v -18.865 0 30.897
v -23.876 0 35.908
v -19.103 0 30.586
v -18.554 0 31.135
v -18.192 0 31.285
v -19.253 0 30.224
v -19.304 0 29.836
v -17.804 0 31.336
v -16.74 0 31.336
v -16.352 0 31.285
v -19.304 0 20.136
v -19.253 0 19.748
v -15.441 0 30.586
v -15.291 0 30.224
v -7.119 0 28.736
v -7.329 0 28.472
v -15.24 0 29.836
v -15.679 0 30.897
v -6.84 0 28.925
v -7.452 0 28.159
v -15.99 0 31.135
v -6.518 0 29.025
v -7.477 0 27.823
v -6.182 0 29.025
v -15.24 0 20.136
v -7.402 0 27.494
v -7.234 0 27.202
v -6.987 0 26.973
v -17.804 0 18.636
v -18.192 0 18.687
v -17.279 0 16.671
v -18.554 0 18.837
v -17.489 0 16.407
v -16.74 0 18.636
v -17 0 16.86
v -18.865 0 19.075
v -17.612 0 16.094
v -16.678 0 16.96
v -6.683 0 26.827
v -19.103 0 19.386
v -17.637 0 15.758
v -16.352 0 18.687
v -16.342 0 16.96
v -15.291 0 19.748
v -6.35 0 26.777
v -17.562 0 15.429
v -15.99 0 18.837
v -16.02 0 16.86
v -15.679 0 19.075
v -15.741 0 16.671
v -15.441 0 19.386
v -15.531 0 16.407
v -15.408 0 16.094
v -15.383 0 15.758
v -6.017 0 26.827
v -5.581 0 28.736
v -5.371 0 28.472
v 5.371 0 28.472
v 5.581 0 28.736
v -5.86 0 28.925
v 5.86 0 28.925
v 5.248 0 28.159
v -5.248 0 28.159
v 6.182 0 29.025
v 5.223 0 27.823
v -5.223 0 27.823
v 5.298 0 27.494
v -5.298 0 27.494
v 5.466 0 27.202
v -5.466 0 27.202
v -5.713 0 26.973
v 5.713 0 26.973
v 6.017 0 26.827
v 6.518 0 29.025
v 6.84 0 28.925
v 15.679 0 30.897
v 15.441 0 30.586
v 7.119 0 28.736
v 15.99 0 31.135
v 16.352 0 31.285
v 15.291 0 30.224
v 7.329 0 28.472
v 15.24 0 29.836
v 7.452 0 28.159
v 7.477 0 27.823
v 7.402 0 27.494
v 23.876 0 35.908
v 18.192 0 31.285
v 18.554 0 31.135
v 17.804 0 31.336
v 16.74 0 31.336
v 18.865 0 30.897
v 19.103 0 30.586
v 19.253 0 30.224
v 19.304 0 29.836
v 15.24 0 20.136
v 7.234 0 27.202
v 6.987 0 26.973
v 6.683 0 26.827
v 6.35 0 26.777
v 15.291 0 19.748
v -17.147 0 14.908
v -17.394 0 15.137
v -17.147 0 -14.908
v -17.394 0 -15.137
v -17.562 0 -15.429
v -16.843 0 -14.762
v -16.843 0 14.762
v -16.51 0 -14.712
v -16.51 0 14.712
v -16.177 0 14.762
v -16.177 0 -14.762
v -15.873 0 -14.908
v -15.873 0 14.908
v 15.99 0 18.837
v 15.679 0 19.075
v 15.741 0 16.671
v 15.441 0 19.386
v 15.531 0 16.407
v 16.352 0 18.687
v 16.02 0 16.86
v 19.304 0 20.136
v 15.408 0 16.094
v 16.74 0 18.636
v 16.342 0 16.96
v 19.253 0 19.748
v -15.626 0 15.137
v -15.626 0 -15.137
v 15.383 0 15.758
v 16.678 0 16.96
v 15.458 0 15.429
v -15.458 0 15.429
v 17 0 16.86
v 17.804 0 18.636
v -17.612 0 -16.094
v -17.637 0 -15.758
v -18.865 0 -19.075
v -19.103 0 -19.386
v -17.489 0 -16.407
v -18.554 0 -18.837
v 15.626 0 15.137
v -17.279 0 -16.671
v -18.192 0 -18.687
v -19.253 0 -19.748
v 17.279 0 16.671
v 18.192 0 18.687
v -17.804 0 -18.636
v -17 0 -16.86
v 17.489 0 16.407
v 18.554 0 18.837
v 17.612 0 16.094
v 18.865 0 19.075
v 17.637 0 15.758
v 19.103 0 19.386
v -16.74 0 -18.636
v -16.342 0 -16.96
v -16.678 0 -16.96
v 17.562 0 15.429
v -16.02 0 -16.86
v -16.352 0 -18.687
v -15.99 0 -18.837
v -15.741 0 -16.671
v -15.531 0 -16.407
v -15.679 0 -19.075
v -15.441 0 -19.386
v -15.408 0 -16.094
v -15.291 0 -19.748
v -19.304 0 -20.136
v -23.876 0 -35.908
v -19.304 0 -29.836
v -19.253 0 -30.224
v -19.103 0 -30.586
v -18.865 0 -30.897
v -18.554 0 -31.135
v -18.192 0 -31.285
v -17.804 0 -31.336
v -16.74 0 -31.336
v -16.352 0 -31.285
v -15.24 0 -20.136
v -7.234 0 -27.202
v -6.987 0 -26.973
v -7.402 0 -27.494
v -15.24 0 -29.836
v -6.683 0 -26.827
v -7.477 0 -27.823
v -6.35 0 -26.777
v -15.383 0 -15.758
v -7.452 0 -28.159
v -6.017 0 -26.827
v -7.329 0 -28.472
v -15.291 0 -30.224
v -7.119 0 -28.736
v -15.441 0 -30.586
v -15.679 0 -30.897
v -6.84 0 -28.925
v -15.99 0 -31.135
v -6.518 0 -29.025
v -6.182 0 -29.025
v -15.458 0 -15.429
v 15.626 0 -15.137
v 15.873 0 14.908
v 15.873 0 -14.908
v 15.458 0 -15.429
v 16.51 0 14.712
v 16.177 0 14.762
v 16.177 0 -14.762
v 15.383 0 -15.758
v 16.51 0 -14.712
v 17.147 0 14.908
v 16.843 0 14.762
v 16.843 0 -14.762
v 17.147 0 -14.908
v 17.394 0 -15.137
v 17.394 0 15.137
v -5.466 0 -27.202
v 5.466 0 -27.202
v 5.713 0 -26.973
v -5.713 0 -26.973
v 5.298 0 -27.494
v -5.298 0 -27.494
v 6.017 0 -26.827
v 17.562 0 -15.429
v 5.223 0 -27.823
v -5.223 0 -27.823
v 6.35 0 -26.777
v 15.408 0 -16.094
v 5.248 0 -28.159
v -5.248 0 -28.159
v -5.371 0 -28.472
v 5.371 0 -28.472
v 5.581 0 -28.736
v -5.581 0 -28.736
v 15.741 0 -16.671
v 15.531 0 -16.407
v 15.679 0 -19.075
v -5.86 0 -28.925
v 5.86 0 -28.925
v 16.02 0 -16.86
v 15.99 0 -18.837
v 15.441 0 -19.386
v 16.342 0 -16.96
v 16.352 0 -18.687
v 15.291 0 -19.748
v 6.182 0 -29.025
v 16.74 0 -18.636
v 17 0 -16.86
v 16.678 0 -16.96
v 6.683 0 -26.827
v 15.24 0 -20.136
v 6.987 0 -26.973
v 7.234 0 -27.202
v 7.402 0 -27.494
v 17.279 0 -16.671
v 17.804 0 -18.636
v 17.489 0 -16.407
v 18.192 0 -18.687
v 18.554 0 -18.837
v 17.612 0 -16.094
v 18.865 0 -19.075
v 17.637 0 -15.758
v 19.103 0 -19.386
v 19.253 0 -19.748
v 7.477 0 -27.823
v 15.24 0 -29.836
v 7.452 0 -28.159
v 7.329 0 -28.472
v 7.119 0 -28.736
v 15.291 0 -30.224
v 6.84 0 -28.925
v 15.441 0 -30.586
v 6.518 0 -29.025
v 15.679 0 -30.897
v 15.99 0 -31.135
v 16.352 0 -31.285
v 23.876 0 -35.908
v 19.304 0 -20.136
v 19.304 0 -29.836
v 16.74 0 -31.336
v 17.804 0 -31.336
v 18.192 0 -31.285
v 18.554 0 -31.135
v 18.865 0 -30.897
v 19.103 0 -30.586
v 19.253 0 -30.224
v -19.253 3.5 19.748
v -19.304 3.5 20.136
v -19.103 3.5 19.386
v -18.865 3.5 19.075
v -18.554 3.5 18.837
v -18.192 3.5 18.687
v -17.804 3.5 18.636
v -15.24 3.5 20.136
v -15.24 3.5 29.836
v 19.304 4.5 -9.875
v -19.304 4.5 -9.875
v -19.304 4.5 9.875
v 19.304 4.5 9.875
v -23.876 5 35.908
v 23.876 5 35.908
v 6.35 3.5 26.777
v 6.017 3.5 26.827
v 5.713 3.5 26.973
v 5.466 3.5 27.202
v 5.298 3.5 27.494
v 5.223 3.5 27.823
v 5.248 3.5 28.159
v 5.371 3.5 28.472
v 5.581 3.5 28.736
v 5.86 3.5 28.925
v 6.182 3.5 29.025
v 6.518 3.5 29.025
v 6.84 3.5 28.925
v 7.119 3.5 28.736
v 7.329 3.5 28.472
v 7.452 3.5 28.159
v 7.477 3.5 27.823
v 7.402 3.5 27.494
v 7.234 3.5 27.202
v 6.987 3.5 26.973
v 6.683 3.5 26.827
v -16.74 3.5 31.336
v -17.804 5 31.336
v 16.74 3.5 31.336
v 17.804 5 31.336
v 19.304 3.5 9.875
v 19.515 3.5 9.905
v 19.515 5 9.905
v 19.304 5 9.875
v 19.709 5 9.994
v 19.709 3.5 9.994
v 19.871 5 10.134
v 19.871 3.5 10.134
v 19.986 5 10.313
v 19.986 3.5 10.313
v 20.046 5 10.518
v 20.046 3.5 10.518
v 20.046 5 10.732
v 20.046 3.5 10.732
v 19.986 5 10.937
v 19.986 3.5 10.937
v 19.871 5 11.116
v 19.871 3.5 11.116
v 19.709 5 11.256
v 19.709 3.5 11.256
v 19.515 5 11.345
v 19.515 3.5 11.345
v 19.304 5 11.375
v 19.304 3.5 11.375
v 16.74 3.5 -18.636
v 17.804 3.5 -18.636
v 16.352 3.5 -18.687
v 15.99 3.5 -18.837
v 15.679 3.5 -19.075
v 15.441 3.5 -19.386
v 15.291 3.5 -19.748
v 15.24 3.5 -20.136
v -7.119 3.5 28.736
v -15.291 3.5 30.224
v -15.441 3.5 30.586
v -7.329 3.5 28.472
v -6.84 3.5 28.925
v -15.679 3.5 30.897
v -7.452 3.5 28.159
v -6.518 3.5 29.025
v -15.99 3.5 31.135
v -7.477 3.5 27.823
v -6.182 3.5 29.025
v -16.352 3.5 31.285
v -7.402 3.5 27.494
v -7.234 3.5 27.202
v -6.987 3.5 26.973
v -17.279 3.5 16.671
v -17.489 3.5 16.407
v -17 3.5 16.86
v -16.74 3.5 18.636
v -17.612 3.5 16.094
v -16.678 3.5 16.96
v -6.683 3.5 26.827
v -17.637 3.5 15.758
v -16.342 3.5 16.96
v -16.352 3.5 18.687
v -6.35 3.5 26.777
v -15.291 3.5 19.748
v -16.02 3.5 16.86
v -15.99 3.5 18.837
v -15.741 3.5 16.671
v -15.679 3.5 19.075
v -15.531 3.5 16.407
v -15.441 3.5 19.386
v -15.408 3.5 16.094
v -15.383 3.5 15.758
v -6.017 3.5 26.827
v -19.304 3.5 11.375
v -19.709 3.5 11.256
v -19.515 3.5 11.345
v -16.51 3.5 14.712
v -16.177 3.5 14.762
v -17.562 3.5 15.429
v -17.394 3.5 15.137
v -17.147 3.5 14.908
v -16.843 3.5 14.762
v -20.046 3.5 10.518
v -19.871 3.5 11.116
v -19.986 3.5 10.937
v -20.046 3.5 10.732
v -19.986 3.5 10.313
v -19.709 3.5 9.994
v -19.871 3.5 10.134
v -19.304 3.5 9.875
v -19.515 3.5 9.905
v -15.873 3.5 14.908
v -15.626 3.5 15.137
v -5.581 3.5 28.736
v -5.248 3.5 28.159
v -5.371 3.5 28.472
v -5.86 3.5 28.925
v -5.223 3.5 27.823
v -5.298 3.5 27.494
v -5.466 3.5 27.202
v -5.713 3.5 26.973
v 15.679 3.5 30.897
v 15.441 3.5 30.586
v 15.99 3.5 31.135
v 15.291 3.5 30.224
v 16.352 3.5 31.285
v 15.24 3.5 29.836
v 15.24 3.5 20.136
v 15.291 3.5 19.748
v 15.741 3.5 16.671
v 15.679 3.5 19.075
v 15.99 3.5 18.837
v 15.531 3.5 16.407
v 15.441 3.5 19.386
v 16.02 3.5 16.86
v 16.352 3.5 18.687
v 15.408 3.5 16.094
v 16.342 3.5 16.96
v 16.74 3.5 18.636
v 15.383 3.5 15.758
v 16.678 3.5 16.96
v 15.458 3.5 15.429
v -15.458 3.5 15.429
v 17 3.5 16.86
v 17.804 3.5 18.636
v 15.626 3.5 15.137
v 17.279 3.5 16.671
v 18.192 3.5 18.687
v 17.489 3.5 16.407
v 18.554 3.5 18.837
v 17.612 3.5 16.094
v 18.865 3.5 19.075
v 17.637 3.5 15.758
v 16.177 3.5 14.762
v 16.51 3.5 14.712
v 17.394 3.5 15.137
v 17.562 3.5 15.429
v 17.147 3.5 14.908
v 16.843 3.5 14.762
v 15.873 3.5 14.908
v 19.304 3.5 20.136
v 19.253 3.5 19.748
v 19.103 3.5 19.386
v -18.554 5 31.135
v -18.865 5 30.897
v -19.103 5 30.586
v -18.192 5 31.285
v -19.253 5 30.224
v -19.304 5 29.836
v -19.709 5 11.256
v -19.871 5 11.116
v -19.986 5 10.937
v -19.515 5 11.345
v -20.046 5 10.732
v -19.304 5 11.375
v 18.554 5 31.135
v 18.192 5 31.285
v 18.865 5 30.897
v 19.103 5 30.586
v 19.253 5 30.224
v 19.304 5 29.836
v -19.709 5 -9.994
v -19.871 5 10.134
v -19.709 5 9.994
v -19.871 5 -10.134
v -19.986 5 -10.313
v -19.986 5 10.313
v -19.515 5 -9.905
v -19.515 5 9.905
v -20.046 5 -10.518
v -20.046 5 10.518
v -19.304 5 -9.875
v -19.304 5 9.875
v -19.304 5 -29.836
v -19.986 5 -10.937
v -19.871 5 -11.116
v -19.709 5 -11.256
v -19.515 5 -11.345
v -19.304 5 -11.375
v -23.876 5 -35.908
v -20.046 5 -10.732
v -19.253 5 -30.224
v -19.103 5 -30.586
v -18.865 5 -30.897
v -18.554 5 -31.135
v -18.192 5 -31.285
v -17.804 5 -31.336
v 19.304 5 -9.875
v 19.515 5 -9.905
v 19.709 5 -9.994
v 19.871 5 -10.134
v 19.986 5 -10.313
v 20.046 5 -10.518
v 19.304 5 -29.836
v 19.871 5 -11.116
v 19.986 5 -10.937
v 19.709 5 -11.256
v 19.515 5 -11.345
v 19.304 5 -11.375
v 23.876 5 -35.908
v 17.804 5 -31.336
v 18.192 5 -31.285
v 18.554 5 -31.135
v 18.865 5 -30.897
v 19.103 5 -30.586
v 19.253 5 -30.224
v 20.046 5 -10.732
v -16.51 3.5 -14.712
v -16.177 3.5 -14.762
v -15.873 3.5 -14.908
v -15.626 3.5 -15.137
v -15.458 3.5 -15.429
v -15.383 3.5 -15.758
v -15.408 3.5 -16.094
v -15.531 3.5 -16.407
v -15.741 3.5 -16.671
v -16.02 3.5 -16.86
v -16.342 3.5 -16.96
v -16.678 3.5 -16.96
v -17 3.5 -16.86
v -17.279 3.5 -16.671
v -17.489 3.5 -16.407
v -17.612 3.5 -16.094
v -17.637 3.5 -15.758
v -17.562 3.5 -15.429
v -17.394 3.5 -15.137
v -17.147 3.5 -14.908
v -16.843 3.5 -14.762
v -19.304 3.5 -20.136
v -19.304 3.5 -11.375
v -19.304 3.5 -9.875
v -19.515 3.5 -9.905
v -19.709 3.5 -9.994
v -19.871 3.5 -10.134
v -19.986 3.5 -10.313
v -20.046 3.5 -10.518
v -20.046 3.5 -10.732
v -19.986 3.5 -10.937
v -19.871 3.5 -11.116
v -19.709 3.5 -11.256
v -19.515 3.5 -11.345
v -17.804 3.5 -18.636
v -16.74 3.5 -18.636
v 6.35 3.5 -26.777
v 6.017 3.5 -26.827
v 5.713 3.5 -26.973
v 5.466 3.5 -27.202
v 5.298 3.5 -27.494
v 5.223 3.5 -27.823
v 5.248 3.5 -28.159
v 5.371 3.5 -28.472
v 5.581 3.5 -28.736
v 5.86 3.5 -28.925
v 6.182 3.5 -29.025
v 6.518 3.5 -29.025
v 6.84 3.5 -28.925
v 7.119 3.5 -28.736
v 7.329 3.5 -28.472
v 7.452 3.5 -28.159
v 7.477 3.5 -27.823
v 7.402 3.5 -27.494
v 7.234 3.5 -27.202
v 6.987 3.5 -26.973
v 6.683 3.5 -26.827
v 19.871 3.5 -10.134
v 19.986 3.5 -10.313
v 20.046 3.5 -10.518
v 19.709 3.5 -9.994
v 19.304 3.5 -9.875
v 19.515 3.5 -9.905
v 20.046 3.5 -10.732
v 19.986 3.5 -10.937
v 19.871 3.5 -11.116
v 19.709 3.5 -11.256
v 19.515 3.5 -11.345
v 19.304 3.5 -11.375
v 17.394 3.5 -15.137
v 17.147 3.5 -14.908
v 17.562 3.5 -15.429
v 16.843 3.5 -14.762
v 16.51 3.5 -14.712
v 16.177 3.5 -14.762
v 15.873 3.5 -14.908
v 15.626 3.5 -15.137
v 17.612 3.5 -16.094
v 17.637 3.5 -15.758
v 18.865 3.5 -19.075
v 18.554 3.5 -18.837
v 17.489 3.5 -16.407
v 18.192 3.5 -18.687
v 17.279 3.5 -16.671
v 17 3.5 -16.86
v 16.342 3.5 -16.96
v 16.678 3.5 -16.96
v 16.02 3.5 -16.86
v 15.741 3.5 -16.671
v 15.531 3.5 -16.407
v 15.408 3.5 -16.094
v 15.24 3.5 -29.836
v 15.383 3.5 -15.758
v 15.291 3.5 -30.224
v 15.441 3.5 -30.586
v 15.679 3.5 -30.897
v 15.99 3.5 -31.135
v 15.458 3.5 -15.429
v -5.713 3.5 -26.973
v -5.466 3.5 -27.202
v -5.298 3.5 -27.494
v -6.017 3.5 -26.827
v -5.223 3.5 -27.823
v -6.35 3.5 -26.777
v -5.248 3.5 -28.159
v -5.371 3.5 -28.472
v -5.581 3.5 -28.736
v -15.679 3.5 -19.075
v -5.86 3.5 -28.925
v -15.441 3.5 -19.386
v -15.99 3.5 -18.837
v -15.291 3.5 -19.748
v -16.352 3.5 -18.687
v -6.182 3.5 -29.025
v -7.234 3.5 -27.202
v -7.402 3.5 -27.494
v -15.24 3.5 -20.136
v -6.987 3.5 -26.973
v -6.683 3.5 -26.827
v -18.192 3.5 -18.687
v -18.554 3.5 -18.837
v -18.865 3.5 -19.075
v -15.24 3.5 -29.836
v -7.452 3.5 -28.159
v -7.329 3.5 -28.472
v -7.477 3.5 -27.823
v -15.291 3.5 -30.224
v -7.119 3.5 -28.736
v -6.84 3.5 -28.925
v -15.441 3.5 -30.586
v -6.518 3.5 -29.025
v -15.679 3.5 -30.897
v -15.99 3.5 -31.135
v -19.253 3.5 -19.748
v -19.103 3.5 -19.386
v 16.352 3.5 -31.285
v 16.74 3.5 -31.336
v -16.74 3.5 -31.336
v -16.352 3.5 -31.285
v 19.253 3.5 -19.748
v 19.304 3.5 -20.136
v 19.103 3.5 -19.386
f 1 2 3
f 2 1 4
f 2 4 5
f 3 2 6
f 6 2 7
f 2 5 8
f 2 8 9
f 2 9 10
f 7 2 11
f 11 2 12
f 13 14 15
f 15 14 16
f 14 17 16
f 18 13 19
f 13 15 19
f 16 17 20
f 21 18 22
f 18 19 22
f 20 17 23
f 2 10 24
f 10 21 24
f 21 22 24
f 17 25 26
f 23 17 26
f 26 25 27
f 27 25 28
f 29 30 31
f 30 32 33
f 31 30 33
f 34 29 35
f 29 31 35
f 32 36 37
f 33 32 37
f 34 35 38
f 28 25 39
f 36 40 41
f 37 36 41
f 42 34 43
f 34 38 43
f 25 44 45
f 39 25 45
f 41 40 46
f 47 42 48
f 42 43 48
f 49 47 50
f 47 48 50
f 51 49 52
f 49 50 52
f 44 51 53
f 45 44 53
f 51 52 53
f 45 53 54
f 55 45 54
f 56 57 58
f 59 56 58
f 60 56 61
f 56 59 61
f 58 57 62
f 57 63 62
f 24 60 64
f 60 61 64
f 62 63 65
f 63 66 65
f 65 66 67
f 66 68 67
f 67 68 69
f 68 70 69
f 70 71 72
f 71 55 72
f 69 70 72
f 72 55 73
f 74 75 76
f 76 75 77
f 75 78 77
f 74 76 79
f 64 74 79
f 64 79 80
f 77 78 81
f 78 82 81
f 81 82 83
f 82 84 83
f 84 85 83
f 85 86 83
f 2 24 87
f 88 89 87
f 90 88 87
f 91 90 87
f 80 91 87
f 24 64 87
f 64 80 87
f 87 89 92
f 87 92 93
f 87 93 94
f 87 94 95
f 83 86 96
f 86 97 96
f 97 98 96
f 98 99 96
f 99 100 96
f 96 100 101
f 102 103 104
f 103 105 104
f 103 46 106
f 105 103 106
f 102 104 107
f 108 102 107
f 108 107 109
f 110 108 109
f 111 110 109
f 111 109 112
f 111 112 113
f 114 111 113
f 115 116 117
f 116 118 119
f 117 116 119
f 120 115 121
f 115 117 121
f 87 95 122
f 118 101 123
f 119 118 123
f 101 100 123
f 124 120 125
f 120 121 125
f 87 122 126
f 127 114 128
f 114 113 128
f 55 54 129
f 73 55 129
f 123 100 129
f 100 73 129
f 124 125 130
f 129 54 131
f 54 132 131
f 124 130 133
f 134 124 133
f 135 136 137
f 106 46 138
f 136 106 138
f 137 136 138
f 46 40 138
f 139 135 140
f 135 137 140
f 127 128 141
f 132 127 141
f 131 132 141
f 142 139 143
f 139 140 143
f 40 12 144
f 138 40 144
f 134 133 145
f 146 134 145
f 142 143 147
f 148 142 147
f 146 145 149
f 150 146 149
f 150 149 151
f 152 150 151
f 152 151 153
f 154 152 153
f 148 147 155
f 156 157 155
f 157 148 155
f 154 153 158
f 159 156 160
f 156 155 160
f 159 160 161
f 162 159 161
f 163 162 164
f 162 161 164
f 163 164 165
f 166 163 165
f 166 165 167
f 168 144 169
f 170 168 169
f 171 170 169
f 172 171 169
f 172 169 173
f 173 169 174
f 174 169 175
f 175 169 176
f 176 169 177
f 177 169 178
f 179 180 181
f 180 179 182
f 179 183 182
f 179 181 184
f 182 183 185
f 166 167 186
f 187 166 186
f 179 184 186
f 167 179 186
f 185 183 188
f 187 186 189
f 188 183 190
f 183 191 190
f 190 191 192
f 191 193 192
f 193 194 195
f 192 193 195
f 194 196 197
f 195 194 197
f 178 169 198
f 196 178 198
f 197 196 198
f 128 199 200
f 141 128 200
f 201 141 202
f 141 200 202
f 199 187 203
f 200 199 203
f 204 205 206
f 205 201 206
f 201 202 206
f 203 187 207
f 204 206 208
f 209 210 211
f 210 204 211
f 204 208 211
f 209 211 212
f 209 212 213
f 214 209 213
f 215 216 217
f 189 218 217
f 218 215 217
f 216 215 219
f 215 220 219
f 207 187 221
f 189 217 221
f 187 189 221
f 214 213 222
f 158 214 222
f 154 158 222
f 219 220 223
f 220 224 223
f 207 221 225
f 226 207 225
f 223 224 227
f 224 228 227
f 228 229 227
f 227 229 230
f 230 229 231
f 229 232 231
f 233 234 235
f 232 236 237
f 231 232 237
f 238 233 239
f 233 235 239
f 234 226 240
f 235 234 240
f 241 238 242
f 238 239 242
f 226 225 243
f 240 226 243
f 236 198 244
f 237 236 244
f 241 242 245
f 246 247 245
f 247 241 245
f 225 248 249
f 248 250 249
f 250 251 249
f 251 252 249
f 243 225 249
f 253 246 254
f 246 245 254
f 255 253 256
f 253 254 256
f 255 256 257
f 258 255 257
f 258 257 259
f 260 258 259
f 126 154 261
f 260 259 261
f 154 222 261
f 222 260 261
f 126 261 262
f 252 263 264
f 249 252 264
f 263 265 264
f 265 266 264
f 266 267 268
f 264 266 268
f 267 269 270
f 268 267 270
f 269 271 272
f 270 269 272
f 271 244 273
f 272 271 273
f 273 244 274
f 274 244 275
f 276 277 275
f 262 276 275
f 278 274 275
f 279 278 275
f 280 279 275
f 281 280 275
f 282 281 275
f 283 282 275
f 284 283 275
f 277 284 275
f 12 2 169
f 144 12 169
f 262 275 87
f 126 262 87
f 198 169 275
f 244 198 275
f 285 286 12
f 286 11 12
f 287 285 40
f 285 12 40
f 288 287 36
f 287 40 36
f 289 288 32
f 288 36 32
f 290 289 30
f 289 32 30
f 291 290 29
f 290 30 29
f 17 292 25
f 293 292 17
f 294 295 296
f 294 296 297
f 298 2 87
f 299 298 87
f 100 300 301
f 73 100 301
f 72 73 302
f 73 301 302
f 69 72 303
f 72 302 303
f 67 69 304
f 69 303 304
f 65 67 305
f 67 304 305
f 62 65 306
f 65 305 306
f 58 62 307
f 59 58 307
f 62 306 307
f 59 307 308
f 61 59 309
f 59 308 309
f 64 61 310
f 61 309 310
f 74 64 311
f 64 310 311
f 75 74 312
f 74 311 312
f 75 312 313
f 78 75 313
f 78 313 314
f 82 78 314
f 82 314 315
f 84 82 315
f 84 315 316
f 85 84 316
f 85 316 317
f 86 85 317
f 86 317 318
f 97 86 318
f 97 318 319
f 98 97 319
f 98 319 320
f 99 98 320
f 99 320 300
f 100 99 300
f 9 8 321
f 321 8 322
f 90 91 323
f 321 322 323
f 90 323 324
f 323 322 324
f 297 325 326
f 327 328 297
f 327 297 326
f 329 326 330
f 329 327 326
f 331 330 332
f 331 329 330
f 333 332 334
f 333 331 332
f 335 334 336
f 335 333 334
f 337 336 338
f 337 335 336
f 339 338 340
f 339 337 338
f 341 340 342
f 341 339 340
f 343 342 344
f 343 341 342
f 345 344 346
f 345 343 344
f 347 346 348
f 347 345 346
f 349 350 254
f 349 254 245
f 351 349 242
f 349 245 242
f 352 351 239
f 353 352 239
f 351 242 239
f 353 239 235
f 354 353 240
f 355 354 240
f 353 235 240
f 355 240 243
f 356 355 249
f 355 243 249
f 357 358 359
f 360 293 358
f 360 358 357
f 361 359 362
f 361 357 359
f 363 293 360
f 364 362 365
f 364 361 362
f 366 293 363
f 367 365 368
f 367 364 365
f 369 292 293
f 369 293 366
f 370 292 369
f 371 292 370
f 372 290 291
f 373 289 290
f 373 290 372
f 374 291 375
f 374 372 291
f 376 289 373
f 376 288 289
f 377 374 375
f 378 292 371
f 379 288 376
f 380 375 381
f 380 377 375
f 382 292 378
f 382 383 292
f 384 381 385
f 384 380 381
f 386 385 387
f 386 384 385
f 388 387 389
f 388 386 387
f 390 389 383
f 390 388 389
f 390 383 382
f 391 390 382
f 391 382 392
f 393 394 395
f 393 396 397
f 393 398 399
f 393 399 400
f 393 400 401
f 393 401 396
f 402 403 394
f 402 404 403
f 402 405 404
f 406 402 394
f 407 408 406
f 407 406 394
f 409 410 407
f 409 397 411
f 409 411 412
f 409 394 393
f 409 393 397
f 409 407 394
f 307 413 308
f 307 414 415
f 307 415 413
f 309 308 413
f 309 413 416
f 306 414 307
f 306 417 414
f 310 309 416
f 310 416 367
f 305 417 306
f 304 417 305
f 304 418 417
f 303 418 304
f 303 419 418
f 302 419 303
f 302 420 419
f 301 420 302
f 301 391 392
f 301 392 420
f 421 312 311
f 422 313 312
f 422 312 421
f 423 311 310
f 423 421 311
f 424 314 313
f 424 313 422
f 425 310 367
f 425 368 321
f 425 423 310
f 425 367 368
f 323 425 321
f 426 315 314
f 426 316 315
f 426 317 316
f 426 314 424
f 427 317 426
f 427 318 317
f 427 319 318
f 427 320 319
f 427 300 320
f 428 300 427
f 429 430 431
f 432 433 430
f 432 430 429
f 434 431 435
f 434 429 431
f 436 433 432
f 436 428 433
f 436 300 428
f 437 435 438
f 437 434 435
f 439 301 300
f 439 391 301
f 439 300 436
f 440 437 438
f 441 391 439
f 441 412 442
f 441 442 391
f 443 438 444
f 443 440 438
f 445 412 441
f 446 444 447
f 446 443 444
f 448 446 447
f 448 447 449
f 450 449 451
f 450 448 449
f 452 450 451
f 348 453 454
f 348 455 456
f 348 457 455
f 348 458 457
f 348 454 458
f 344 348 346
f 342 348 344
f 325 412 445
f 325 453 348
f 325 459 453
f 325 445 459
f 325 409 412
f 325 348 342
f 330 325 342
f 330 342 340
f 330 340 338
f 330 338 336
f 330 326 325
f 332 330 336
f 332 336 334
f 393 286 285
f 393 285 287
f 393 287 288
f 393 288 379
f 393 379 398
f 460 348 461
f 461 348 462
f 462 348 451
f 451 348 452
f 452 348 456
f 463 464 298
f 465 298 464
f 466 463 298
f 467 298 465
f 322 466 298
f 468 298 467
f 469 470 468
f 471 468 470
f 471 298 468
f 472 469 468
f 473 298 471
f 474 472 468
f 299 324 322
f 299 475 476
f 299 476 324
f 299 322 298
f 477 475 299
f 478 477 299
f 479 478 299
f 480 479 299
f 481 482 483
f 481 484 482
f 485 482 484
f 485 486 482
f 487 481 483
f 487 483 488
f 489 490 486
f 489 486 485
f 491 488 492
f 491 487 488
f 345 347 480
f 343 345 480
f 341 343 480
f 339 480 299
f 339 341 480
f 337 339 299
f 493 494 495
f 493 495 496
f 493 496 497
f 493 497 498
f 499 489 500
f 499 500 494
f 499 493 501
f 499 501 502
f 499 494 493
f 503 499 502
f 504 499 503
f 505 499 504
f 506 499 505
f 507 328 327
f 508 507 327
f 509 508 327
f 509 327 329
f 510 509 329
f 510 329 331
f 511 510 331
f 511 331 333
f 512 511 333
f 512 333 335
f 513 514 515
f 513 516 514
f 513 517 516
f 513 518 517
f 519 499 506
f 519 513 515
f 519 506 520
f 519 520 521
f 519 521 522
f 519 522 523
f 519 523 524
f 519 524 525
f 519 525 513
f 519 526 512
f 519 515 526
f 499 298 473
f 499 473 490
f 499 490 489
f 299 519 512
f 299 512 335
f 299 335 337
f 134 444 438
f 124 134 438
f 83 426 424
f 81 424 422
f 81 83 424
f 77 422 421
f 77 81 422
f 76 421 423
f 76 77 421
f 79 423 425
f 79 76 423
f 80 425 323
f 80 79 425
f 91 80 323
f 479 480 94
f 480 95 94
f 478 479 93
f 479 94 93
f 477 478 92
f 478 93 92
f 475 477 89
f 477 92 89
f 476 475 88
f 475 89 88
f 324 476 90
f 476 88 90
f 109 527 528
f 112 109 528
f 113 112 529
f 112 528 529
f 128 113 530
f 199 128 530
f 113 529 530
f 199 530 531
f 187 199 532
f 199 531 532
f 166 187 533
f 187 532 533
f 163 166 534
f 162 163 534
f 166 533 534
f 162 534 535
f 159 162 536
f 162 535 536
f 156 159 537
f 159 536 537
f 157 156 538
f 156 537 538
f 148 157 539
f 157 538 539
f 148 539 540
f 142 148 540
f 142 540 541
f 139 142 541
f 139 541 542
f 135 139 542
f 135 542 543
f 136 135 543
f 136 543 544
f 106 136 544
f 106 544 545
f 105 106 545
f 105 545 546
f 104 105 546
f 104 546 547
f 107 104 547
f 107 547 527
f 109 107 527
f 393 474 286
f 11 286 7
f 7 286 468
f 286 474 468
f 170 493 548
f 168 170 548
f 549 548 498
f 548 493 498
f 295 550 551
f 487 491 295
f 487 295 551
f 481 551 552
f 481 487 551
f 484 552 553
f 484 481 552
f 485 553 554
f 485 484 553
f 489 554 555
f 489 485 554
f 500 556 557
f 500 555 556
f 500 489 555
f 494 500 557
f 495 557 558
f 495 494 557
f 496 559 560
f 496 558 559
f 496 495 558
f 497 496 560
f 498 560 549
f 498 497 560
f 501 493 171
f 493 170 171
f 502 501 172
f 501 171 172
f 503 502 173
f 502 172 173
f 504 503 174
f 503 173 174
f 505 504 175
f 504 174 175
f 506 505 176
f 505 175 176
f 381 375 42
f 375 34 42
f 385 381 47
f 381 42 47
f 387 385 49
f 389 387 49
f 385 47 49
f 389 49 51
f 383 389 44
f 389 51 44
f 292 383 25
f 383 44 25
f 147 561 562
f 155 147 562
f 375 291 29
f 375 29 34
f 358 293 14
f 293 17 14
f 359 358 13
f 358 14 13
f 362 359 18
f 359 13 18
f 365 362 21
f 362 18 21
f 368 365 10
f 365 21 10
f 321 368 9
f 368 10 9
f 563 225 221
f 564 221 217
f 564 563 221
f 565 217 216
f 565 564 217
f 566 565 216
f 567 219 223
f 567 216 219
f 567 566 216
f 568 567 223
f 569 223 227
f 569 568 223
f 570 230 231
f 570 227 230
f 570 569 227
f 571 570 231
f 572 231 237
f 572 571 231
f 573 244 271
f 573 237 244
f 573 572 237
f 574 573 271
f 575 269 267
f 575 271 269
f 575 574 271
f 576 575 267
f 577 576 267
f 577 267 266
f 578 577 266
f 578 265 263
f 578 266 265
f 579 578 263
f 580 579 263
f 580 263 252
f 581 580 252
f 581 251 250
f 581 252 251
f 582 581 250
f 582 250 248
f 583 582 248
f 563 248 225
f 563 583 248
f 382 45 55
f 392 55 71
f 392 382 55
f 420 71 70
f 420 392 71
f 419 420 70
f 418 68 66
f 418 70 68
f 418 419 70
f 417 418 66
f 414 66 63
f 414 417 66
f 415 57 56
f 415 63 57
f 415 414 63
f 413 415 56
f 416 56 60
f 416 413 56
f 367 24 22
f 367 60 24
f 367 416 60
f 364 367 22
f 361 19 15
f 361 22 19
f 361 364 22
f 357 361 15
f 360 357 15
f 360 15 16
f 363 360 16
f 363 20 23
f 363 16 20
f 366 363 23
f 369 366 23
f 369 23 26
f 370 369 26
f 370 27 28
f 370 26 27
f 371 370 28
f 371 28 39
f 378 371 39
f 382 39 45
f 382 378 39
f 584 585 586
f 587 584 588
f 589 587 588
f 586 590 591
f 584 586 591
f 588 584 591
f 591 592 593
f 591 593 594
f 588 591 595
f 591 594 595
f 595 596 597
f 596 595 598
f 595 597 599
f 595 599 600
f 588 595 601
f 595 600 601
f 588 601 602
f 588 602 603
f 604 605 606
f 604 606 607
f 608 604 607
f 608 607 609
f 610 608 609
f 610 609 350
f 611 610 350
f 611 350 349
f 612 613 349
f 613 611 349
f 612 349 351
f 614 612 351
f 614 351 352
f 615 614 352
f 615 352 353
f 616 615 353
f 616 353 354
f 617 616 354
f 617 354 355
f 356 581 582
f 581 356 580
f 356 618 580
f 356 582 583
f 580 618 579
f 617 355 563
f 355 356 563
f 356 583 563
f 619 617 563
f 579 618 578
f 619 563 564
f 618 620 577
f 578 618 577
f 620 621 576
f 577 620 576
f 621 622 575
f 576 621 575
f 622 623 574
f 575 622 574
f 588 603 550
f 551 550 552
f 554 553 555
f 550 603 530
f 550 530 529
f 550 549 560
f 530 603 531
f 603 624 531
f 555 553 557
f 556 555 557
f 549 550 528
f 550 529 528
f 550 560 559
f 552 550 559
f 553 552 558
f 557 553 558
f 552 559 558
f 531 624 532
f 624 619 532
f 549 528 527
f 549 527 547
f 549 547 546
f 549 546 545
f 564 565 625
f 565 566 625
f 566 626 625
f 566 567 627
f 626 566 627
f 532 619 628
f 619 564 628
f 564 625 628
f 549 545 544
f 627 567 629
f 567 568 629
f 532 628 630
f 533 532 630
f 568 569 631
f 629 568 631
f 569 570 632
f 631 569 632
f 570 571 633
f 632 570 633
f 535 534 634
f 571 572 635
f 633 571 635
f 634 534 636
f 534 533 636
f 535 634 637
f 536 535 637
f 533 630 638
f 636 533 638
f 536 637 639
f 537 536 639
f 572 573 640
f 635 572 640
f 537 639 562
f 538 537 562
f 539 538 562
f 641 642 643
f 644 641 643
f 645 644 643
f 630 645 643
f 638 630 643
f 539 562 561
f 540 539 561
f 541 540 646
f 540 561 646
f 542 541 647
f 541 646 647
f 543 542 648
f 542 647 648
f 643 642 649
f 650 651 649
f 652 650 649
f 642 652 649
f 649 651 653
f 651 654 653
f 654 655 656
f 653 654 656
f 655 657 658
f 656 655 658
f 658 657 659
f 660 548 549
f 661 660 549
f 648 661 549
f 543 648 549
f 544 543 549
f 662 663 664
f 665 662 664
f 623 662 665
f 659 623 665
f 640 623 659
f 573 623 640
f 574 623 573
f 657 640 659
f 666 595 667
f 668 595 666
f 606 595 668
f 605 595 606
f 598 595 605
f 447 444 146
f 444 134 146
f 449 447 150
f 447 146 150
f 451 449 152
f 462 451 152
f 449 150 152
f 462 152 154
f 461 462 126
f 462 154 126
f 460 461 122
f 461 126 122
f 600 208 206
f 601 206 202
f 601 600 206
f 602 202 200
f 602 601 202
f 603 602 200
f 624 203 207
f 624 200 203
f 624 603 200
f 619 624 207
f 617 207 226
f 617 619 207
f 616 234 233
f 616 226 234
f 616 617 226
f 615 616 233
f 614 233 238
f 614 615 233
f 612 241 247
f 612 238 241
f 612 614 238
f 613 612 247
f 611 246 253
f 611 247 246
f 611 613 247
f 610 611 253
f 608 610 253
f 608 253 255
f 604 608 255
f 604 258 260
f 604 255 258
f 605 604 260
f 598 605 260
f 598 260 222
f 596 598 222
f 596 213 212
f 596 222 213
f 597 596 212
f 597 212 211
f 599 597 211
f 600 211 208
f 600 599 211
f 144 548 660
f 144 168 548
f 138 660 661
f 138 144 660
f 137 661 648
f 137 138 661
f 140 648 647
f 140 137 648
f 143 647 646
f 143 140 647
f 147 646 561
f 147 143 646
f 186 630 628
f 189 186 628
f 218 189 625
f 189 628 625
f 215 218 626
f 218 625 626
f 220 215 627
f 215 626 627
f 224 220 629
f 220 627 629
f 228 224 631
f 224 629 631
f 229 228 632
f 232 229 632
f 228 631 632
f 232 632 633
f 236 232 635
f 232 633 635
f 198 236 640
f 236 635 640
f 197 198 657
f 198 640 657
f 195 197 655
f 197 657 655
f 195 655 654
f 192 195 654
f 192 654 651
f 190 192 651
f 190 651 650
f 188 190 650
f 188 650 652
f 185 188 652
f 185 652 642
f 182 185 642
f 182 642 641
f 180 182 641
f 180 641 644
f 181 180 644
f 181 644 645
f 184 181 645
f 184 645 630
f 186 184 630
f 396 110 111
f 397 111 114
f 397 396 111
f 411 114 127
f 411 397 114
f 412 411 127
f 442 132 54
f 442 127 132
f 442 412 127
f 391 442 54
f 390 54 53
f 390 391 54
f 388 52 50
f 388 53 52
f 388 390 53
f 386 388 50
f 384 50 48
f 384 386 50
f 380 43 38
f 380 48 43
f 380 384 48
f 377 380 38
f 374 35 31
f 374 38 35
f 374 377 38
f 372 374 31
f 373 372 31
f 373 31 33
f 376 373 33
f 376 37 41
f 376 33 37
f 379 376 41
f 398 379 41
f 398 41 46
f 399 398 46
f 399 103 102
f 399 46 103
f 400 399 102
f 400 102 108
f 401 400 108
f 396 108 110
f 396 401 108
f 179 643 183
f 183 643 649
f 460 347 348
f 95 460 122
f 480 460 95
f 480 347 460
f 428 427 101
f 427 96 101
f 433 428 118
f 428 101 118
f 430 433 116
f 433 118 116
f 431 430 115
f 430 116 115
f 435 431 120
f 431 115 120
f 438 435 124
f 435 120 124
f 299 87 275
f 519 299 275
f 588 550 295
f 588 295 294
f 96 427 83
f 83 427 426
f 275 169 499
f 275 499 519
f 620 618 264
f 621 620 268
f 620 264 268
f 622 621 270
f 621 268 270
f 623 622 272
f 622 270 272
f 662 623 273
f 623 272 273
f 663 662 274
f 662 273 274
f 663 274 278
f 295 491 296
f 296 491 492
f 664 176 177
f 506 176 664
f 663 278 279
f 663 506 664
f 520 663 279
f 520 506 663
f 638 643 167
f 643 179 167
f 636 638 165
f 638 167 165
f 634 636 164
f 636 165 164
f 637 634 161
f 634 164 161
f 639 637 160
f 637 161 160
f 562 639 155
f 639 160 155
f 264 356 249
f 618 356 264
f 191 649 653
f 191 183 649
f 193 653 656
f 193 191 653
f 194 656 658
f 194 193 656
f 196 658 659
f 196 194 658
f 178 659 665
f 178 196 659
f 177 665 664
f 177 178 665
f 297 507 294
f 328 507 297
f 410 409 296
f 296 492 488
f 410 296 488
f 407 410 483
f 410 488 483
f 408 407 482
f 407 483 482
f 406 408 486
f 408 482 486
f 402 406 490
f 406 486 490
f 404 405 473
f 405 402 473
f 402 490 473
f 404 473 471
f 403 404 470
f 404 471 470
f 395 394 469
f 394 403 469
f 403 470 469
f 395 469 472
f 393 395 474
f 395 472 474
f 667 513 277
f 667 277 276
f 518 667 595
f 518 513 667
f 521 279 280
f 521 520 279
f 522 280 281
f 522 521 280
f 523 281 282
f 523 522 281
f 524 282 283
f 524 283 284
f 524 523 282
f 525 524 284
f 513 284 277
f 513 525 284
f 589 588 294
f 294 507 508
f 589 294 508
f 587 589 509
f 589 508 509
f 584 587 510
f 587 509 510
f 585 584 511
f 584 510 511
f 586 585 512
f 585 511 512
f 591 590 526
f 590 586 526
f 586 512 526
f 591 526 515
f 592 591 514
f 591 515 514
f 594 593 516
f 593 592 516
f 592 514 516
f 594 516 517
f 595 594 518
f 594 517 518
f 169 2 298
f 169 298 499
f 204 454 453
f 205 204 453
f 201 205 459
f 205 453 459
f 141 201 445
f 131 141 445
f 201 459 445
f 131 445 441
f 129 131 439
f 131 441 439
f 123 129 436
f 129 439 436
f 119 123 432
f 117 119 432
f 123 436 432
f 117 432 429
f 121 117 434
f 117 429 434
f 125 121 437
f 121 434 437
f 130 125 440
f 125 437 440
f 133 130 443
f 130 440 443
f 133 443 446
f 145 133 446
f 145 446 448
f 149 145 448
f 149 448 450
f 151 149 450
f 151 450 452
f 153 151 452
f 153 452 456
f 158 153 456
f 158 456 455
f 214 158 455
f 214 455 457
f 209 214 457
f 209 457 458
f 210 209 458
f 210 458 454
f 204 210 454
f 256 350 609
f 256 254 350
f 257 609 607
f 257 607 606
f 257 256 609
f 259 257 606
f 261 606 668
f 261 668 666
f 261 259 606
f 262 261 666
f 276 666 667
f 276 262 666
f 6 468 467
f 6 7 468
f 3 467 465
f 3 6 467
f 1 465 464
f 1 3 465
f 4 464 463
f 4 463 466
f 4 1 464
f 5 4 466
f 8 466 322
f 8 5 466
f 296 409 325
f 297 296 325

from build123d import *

# Parameters (mm, degrees)
SKETCH1_W                                  = 47.752
SKETCH1_H                                  = 71.816
BOSS_EXTRUDE1_DEPTH                        = 5
SKETCH2_W                                  = 38.608
SKETCH2_H                                  = 62.672
CUT_EXTRUDE1_DEPTH                         = 1.5
SKETCH3_W                                  = 4.064
SKETCH3_H                                  = 12.7
CUT_EXTRUDE2_DEPTH                         = 44.263123327
MIRROR4_AT_THE_SECOND_PLANE_COPY_1_SKETC_W = 4.064
MIRROR4_AT_THE_SECOND_PLANE_COPY_1_SKETC_H = 12.7
MIRROR4_AT_THE_SECOND_PLANE_COPY_1_DEPTH   = 44.263123327
FILLET2_R                                  = 1.5
SKETCH4_R                                  = 1.1303
CUT_EXTRUDE3_DEPTH                         = 44.263123327
MIRROR5_AT_THE_SECOND_PLANE_COPY_1_SKETC_R = 1.1303
MIRROR5_AT_THE_SECOND_PLANE_COPY_1_DEPTH   = 44.263123327
SKETCH5_W                                  = 38.608
SKETCH5_H                                  = 19.75
BOSS_EXTRUDE2_DEPTH                        = 1
CUT_EXTRUDE4_REACH                         = 45.41
MIRROR6_AT_THE_SECOND_PLANE_COPY_1_REACH   = 45.41


with BuildPart() as part:
    # Sketch1 → Boss-Extrude1 (new body)
    with BuildSketch(Plane(origin=(0, 0, 0), x_dir=(1, 0, 0), z_dir=(0, 1, 0))):
        Rectangle(SKETCH1_W, SKETCH1_H)
    extrude(amount=BOSS_EXTRUDE1_DEPTH)

    # Sketch2 → Cut-Extrude1 (cut)
    with BuildSketch(Plane(origin=(0, 5, 0), x_dir=(1, 0, 0), z_dir=(0, 1, 0))):
        Rectangle(SKETCH2_W, SKETCH2_H)
    extrude(amount=-CUT_EXTRUDE1_DEPTH, mode=Mode.SUBTRACT)

    # Sketch3 → Cut-Extrude2 (cut, through all)
    with BuildSketch(Plane(origin=(0, 3.5, 0), x_dir=(1, 0, 0), z_dir=(0, 1, 0))):
        with Locations((-17.272, 24.986)):
            Rectangle(SKETCH3_W, SKETCH3_H)
    cut_extrude2 = extrude(amount=-CUT_EXTRUDE2_DEPTH, mode=Mode.SUBTRACT)

    # Mirror4: Cut-Extrude2 across plane
    add(cut_extrude2.mirror(Plane.XY), mode=Mode.SUBTRACT)

    # Mirror4 at the second plane: Cut-Extrude2 across plane
    add(cut_extrude2.mirror(Plane(origin=(0, 0, 0), x_dir=(0, 0, 1), z_dir=(1, 0, 0))), mode=Mode.SUBTRACT)

    # Mirror4 at the second plane copy 1 sketc → Mirror4 at the second plane copy 1 (cut, through all)
    with BuildSketch(Plane(origin=(0, 3.5, 0), x_dir=(-1, 0, 0), z_dir=(0, 1, 0))):
        with Locations((-17.272, 24.986)):
            Rectangle(MIRROR4_AT_THE_SECOND_PLANE_COPY_1_SKETC_W, MIRROR4_AT_THE_SECOND_PLANE_COPY_1_SKETC_H)
    extrude(amount=-MIRROR4_AT_THE_SECOND_PLANE_COPY_1_DEPTH, mode=Mode.SUBTRACT)

    # Fillet2
    fillet2_edges = [part.edges().sort_by_distance(p)[0] for p in [
        (19.304, 2.5, -31.336),
        (19.304, 2.5, 31.336),
        (-19.304, 2.5, 31.336),
        (-19.304, 2.5, -31.336),
        (-19.304, 1.75, -18.636),
        (-15.24, 1.75, -31.336),
        (-15.24, 1.75, -18.636),
        (19.304, 1.75, -18.636),
        (15.24, 1.75, -18.636),
        (15.24, 1.75, -31.336),
        (-19.304, 1.75, 18.636),
        (-15.24, 1.75, 18.636),
        (-15.24, 1.75, 31.336),
        (19.304, 1.75, 18.636),
        (15.24, 1.75, 31.336),
        (15.24, 1.75, 18.636),
    ]]
    fillet(fillet2_edges, radius=FILLET2_R)

    # Sketch4 → Cut-Extrude3 (cut, through all)
    with BuildSketch(Plane(origin=(0, 3.5, 0), x_dir=(1, 0, 0), z_dir=(0, 1, 0))):
        with Locations(Location((-6.35, 27.907, 0), (0, 0, 270))):
            Circle(SKETCH4_R)
        with Locations(Location((-16.51, 15.842, 0), (0, 0, 270))):
            Circle(SKETCH4_R)
    cut_extrude3 = extrude(amount=-CUT_EXTRUDE3_DEPTH, mode=Mode.SUBTRACT)

    # Mirror5: Cut-Extrude3 across plane
    add(cut_extrude3.mirror(Plane.XY), mode=Mode.SUBTRACT)

    # Mirror5 at the second plane: Cut-Extrude3 across plane
    add(cut_extrude3.mirror(Plane(origin=(0, 0, 0), x_dir=(0, 0, 1), z_dir=(1, 0, 0))), mode=Mode.SUBTRACT)

    # Mirror5 at the second plane copy 1 sketc → Mirror5 at the second plane copy 1 (cut, through all)
    with BuildSketch(Plane(origin=(0, 3.5, 0), x_dir=(-1, 0, 0), z_dir=(0, 1, 0))):
        with Locations(Location((-6.35, 27.907, 0), (0, 0, 270))):
            Circle(MIRROR5_AT_THE_SECOND_PLANE_COPY_1_SKETC_R)
        with Locations(Location((-16.51, 15.842, 0), (0, 0, 270))):
            Circle(MIRROR5_AT_THE_SECOND_PLANE_COPY_1_SKETC_R)
    extrude(amount=-MIRROR5_AT_THE_SECOND_PLANE_COPY_1_DEPTH, mode=Mode.SUBTRACT)

    # Sketch5 → Boss-Extrude2 (add)
    with BuildSketch(Plane(origin=(0, 3.5, 0), x_dir=(1, 0, 0), z_dir=(0, 1, 0))):
        Rectangle(SKETCH5_W, SKETCH5_H)
    extrude(amount=BOSS_EXTRUDE2_DEPTH)

    # Cut-Extrude4: up to this face of the body (flat: up to its plane)
    cut_extrude4_end = Plane(part.part.faces().sort_by_distance((0, 3.5, -19.951636366))[0])
    # Sketch6 → Cut-Extrude4 (cut, up to the picked face)
    with BuildSketch(Plane(origin=(0, 5, 0), x_dir=(1, 0, 0), z_dir=(0, 1, 0)), mode=Mode.PRIVATE) as cut_extrude4_sk1:
        with BuildLine():
            Line((-19.304, 11.375), (-19.304, 9.875))
            ThreePointArc((-19.304, 9.875), (-20.054, 10.625), (-19.304, 11.375))
        make_face()
    cut_extrude4_tool1 = split(extrude(cut_extrude4_sk1.sketch, amount=-CUT_EXTRUDE4_REACH, mode=Mode.PRIVATE), bisect_by=cut_extrude4_end, keep=Keep.BOTH, mode=Mode.PRIVATE)
    cut_extrude4 = cut_extrude4_tool1.solids().sort_by(Axis((-19.62231, 5, -10.625), (0, -1, 0)))[0]
    add(cut_extrude4, mode=Mode.SUBTRACT)

    # Mirror6: Cut-Extrude4 across plane
    add(cut_extrude4.mirror(Plane.XY), mode=Mode.SUBTRACT)

    # Mirror6 at the second plane: Cut-Extrude4 across plane
    add(cut_extrude4.mirror(Plane(origin=(0, 0, 0), x_dir=(0, 0, 1), z_dir=(1, 0, 0))), mode=Mode.SUBTRACT)

    # Mirror6 at the second plane copy 1: up to this face of the body (flat: up to its plane)
    mirror6_at_the_second_plane_copy_1_end = Plane(part.part.faces().sort_by_distance((0, 3.5, 19.951636366))[0])
    # Mirror6 at the second plane copy 1 sketc → Mirror6 at the second plane copy 1 (cut, up to the picked face)
    with BuildSketch(Plane(origin=(0, 5, 0), x_dir=(-1, 0, 0), z_dir=(0, 1, 0)), mode=Mode.PRIVATE) as mirror6_at_the_second_plane_copy_1_sk1:
        with BuildLine():
            Line((-19.304, 11.375), (-19.304, 9.875))
            ThreePointArc((-19.304, 9.875), (-20.054, 10.625), (-19.304, 11.375))
        make_face()
    mirror6_at_the_second_plane_copy_1_tool1 = split(extrude(mirror6_at_the_second_plane_copy_1_sk1.sketch, amount=-MIRROR6_AT_THE_SECOND_PLANE_COPY_1_REACH, mode=Mode.PRIVATE), bisect_by=mirror6_at_the_second_plane_copy_1_end, keep=Keep.BOTH, mode=Mode.PRIVATE)
    add(mirror6_at_the_second_plane_copy_1_tool1.solids().sort_by(Axis((19.62231, 5, 10.625), (0, -1, 0)))[0], mode=Mode.SUBTRACT)


solid = part.part
